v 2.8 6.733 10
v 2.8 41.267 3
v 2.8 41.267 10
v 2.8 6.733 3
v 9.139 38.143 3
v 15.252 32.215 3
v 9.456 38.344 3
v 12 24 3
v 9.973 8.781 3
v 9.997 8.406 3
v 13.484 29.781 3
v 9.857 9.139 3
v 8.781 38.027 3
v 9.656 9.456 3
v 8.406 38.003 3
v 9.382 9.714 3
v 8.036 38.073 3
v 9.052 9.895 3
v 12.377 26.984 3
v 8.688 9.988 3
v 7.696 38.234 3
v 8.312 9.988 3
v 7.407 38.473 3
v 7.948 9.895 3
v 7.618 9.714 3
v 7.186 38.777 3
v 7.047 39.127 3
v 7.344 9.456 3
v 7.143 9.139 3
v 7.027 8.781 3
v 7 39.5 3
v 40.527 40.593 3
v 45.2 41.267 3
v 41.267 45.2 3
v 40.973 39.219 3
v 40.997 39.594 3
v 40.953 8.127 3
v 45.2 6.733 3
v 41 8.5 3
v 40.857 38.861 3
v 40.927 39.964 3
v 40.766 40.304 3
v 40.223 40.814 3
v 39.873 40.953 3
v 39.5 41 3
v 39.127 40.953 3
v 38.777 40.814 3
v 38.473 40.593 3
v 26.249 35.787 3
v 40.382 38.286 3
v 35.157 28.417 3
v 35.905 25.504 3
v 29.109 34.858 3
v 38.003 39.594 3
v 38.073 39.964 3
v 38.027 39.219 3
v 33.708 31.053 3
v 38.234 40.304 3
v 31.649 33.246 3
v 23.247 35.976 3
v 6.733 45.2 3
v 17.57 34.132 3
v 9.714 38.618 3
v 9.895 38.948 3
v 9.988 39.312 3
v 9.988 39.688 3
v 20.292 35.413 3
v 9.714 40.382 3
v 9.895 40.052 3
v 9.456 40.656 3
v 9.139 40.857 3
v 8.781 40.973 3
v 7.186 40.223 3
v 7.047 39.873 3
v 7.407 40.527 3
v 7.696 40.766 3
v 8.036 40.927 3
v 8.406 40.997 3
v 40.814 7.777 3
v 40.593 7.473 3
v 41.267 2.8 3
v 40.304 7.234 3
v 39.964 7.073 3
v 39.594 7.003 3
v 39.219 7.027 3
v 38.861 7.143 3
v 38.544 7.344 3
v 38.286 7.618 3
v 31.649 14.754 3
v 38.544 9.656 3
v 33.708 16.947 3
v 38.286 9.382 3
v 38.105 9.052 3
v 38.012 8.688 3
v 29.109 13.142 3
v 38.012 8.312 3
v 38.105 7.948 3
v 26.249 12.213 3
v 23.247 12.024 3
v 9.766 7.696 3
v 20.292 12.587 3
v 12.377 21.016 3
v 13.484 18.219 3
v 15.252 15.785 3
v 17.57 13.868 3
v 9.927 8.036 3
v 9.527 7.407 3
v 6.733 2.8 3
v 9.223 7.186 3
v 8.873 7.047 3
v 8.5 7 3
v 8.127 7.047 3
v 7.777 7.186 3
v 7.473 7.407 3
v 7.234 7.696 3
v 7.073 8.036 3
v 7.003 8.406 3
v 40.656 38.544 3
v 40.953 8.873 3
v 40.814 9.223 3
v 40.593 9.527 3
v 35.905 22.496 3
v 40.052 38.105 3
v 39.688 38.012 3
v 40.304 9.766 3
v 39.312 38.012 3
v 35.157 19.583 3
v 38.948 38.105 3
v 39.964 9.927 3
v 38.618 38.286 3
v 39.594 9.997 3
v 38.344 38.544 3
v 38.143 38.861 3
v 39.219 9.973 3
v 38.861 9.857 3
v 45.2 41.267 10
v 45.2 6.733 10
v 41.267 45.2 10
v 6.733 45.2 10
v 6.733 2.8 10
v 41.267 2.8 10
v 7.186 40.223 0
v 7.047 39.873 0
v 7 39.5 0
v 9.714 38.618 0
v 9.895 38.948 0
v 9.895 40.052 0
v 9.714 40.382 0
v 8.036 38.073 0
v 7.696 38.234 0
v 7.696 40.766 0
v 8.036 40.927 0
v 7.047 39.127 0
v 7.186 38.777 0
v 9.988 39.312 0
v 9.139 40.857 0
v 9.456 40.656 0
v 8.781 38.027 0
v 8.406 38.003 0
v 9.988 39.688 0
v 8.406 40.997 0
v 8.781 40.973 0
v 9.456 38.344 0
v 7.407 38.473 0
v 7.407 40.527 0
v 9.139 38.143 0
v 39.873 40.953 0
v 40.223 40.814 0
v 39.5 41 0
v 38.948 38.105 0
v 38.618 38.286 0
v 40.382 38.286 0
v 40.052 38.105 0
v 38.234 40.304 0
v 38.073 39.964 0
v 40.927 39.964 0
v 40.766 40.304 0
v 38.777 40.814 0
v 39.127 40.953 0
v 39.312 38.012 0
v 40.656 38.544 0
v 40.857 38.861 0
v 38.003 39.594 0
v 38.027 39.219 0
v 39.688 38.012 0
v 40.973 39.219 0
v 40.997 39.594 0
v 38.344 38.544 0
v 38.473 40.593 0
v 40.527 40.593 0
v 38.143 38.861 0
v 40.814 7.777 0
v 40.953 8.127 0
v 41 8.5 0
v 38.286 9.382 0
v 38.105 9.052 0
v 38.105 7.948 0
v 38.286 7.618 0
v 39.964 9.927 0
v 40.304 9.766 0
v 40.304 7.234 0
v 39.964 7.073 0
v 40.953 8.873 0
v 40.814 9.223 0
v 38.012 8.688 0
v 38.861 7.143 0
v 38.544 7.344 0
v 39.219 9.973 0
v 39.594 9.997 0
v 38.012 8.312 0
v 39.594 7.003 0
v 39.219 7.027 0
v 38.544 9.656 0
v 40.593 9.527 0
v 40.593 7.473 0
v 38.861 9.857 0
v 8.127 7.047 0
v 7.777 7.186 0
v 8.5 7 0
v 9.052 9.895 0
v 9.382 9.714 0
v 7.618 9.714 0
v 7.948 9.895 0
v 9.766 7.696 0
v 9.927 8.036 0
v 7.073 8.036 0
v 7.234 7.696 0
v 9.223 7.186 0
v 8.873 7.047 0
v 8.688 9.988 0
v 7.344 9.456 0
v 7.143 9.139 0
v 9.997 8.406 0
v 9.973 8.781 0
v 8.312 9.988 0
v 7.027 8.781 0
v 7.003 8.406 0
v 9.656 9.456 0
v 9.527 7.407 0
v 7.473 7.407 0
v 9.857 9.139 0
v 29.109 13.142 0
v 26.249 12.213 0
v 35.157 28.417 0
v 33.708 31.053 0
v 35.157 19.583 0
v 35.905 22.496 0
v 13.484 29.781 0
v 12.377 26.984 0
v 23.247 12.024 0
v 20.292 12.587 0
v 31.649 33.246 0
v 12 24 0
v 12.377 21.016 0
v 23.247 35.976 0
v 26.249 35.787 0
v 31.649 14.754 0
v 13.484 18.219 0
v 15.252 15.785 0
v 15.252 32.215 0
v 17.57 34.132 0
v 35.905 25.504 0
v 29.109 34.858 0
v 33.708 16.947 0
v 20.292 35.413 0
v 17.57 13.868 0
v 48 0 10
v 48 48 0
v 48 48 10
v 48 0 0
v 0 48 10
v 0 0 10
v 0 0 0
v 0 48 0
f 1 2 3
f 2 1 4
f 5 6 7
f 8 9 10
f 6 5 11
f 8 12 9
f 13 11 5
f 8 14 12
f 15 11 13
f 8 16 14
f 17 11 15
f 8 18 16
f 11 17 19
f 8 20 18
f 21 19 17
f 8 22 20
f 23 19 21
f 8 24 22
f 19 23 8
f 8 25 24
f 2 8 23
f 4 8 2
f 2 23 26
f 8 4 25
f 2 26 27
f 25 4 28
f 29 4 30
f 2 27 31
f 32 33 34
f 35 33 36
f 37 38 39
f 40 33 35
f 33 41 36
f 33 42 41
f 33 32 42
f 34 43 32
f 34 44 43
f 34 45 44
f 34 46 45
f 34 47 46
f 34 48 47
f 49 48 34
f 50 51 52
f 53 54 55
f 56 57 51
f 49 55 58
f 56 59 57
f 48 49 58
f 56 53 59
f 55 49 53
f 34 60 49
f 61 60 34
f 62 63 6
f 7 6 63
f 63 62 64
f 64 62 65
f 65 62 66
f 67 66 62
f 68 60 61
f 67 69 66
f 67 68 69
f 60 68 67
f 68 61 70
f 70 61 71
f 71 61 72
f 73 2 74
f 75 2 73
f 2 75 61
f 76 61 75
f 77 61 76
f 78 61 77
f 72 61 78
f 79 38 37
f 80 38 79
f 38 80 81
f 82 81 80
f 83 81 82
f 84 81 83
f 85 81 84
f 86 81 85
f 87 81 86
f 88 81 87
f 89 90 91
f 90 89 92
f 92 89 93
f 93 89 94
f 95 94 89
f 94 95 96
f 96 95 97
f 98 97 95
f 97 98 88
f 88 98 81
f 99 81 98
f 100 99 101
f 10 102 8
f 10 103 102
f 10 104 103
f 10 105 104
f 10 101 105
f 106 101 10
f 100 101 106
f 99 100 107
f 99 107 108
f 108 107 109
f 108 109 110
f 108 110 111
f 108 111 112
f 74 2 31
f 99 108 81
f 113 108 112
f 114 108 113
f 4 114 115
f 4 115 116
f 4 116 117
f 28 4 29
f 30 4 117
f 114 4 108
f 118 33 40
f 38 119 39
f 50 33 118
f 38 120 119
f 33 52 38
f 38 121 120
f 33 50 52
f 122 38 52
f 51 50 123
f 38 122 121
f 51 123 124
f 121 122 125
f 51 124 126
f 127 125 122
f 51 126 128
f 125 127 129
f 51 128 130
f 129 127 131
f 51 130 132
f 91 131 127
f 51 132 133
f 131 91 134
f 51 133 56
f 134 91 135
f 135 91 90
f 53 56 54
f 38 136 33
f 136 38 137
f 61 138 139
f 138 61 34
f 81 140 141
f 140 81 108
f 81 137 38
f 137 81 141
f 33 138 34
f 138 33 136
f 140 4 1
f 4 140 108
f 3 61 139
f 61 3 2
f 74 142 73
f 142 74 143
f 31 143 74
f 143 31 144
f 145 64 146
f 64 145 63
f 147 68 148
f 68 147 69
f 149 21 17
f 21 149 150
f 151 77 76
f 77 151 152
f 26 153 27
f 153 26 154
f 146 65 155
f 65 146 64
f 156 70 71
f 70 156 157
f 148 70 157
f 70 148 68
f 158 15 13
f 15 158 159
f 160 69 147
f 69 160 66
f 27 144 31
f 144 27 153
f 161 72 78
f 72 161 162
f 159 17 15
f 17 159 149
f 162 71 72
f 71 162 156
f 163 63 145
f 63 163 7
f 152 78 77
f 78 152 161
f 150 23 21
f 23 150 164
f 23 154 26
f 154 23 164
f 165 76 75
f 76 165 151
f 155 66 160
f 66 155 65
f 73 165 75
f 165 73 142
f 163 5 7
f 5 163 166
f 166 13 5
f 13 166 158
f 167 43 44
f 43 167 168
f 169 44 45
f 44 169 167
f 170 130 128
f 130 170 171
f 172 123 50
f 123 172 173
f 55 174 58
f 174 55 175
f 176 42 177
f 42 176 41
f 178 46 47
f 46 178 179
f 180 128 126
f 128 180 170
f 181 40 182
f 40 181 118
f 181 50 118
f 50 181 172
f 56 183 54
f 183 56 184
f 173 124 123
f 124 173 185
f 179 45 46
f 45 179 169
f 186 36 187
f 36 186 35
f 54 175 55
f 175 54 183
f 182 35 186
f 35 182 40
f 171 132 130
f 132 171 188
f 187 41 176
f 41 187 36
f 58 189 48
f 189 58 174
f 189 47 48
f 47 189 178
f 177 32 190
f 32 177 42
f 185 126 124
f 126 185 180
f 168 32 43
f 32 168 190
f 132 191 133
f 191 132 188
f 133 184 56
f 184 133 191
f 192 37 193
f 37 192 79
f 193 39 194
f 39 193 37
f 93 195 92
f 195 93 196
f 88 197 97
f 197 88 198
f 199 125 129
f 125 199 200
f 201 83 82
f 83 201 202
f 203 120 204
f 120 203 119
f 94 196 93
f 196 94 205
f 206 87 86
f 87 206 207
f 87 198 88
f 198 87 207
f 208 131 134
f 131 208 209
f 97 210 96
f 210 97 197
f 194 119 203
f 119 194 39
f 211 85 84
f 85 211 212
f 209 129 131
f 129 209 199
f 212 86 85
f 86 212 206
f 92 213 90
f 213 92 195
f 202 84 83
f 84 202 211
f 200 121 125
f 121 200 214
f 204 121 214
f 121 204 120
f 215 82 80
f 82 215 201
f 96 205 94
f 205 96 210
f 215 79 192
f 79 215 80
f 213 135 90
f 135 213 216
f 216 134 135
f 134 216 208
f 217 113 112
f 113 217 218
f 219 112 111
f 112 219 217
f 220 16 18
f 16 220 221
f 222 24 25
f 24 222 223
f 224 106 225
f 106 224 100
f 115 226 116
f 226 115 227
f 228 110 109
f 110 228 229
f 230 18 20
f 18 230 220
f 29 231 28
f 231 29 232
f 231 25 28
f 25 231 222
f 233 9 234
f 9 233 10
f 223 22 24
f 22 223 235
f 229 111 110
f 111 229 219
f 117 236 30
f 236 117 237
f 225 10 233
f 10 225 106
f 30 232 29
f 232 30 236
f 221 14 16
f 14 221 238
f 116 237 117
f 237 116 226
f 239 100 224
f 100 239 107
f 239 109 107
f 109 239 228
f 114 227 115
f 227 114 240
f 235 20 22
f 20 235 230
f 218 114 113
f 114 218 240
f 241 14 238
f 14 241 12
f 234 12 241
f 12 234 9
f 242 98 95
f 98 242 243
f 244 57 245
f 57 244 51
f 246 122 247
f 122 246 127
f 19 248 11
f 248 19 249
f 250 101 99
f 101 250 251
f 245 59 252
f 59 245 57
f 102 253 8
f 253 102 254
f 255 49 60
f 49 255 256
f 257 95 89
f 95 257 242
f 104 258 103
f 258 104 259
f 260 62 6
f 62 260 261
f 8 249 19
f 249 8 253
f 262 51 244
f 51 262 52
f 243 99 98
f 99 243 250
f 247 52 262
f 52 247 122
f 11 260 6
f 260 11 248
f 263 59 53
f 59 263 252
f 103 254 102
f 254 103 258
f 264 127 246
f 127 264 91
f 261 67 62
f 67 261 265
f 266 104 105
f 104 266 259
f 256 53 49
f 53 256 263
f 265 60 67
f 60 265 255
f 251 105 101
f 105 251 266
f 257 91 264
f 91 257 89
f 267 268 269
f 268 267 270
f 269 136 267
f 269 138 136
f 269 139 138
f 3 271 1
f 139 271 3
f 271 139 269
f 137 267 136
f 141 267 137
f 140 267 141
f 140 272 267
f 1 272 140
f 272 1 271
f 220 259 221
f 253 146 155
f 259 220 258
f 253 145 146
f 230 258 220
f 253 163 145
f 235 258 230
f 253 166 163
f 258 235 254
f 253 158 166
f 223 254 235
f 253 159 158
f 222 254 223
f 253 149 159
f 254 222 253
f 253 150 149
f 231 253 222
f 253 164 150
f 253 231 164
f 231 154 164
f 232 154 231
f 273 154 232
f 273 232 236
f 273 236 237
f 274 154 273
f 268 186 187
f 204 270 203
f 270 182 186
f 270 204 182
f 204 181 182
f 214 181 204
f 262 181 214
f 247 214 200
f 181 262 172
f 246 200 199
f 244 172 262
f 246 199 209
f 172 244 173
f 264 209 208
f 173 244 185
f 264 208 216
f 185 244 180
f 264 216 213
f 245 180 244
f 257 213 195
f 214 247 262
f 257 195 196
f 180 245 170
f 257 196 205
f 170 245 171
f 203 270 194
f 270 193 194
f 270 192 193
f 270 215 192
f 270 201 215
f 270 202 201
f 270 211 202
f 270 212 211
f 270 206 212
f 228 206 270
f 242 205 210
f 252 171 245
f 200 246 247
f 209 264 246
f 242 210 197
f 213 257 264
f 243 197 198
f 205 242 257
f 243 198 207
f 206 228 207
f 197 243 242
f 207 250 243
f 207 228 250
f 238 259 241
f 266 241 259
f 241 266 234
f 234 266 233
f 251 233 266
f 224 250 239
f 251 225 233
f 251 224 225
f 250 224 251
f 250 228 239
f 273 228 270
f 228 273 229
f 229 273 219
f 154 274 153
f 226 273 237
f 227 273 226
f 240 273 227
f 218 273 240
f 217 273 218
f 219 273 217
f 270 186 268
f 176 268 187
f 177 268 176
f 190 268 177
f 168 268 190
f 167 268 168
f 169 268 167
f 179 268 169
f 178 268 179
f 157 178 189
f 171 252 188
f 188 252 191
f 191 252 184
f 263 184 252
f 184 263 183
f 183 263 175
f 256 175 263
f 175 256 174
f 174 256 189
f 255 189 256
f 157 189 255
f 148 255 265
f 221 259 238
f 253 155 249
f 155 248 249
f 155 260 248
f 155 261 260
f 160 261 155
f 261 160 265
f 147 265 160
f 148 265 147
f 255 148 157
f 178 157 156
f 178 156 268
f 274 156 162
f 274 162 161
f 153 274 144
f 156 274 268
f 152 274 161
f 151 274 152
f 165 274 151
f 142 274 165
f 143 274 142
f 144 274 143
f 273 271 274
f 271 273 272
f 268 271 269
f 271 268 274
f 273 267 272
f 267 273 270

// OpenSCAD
// file: nema17.scad
// Basic Nema 17 Stepper Motor

screw_diameter = 3;

motor_base_height = 42;
motor_width = 42;
motor_bevel_width = 54;

motor_center_radius = 11;
motor_center_height = 2;

motor_shaft_length = 20;
motor_shaft_radius = 2.5;

motor_screw_offset = 15.5;
motor_screw_depth = 5;

motor_pully_diameter1 = 16;
motor_pully_diameter2 = 12;
motor_pully_diameter3 = 16;
motor_pully_height1 = 10;
motor_pully_height2 = 5;
motor_pully_height3 = 1;
motor_pully_height = motor_pully_height1 + motor_pully_height2 + motor_pully_height3;

motor_pully_diameter = 16;

motor_height = motor_base_height + motor_center_height + motor_shaft_length;

module motor() {
    
    union() {

    translate([0,0,motor_base_height/2])
    difference(){
        
        // Motor Body
        color([0,0,0])
        intersection(){
            cube([motor_width,motor_width, motor_base_height], center = true);
            rotate([0,0,45]) 
                translate([0,0,-1]) 
                    cube([motor_bevel_width, motor_bevel_width, motor_base_height+2], center = true);
        }
             
            
        // Screw Holes
        color([1/3,1/3,1/3]) 
        for(i=[0:3]){
                rotate([0, 0, 90*i])
                    translate([motor_screw_offset, motor_screw_offset, 0.1-motor_screw_depth+motor_base_height/2]) 
                        cylinder(h=motor_screw_depth, d=screw_diameter, $fn=25);
        }
    }
    // Motor Center
    color([1/3,1/3,1/3]) 
    translate([0, 0, motor_base_height]) 
        cylinder(h=motor_center_height, r=motor_center_radius, $fn=25);
        
    // Motor Shaft
    color([1/3,1/3,1/3]) 
    translate([0, 0, motor_base_height+motor_center_height]) 
        cylinder(h=motor_shaft_length, r=motor_shaft_radius, $fn=25);
    
    // Motor Pully
    color([1/2,1/2,1/2]) 
    translate([0, 0, motor_base_height+motor_center_height+motor_shaft_length-motor_pully_height])  {
            cylinder(h=motor_pully_height1, d=motor_pully_diameter1, $fn=25);
            translate([0,0,motor_pully_height1]) {
                cylinder(h=motor_pully_height2, d=motor_pully_diameter2, $fn=25);
                translate([0,0,motor_pully_height2])
                    cylinder(h=motor_pully_height3, d=motor_pully_diameter3, $fn=25);
            }
        }
    }
}

motor_negative_shaft_diameter = motor_center_radius+1;
module motor_negative(screw_hole_depth=10) {
    extra_space = 0.4;
    
    echo(screw_hole_depth);
    translate([0,0,-motor_base_height])
    union() {

    translate([0,0,motor_base_height*2])
        
        // Motor Body
        translate([0,0,-motor_base_height])
        intersection(){
            cube([motor_width+extra_space,motor_width+extra_space, motor_base_height*2], center = true);
            rotate([0,0,45]) 
                translate([0,0,-1]) 
                    cube([motor_bevel_width+extra_space, motor_bevel_width+extra_space, motor_base_height*2+2], center = true);
        }
            
        // Screw Holes
        for(i=[0:3]){
                rotate([0, 0, 90*i])
                    translate([motor_screw_offset, motor_screw_offset, motor_base_height*2-1]) {
                        cylinder(h=screw_hole_depth+1, d=screw_diameter, $fn=25);
                        translate([0,0, screw_hole_depth+1])
                            cylinder(h=100, d=6, $fn=25);
                            
                    }
    }
    // Motor Center
    translate([0, 0, motor_base_height*2-1]) 
        cylinder(h=101+screw_hole_depth, r=motor_negative_shaft_diameter, $fn=25);
    }
}
// main file
// Motor Test Piece
//      So I can find a good fit without printing the whole assembally every time

include <nema17.scad>

difference() {
    cube([48,48,10]);

    translate([24,24,45])
        rotate([0,180,0])
            motor_negative();
}
